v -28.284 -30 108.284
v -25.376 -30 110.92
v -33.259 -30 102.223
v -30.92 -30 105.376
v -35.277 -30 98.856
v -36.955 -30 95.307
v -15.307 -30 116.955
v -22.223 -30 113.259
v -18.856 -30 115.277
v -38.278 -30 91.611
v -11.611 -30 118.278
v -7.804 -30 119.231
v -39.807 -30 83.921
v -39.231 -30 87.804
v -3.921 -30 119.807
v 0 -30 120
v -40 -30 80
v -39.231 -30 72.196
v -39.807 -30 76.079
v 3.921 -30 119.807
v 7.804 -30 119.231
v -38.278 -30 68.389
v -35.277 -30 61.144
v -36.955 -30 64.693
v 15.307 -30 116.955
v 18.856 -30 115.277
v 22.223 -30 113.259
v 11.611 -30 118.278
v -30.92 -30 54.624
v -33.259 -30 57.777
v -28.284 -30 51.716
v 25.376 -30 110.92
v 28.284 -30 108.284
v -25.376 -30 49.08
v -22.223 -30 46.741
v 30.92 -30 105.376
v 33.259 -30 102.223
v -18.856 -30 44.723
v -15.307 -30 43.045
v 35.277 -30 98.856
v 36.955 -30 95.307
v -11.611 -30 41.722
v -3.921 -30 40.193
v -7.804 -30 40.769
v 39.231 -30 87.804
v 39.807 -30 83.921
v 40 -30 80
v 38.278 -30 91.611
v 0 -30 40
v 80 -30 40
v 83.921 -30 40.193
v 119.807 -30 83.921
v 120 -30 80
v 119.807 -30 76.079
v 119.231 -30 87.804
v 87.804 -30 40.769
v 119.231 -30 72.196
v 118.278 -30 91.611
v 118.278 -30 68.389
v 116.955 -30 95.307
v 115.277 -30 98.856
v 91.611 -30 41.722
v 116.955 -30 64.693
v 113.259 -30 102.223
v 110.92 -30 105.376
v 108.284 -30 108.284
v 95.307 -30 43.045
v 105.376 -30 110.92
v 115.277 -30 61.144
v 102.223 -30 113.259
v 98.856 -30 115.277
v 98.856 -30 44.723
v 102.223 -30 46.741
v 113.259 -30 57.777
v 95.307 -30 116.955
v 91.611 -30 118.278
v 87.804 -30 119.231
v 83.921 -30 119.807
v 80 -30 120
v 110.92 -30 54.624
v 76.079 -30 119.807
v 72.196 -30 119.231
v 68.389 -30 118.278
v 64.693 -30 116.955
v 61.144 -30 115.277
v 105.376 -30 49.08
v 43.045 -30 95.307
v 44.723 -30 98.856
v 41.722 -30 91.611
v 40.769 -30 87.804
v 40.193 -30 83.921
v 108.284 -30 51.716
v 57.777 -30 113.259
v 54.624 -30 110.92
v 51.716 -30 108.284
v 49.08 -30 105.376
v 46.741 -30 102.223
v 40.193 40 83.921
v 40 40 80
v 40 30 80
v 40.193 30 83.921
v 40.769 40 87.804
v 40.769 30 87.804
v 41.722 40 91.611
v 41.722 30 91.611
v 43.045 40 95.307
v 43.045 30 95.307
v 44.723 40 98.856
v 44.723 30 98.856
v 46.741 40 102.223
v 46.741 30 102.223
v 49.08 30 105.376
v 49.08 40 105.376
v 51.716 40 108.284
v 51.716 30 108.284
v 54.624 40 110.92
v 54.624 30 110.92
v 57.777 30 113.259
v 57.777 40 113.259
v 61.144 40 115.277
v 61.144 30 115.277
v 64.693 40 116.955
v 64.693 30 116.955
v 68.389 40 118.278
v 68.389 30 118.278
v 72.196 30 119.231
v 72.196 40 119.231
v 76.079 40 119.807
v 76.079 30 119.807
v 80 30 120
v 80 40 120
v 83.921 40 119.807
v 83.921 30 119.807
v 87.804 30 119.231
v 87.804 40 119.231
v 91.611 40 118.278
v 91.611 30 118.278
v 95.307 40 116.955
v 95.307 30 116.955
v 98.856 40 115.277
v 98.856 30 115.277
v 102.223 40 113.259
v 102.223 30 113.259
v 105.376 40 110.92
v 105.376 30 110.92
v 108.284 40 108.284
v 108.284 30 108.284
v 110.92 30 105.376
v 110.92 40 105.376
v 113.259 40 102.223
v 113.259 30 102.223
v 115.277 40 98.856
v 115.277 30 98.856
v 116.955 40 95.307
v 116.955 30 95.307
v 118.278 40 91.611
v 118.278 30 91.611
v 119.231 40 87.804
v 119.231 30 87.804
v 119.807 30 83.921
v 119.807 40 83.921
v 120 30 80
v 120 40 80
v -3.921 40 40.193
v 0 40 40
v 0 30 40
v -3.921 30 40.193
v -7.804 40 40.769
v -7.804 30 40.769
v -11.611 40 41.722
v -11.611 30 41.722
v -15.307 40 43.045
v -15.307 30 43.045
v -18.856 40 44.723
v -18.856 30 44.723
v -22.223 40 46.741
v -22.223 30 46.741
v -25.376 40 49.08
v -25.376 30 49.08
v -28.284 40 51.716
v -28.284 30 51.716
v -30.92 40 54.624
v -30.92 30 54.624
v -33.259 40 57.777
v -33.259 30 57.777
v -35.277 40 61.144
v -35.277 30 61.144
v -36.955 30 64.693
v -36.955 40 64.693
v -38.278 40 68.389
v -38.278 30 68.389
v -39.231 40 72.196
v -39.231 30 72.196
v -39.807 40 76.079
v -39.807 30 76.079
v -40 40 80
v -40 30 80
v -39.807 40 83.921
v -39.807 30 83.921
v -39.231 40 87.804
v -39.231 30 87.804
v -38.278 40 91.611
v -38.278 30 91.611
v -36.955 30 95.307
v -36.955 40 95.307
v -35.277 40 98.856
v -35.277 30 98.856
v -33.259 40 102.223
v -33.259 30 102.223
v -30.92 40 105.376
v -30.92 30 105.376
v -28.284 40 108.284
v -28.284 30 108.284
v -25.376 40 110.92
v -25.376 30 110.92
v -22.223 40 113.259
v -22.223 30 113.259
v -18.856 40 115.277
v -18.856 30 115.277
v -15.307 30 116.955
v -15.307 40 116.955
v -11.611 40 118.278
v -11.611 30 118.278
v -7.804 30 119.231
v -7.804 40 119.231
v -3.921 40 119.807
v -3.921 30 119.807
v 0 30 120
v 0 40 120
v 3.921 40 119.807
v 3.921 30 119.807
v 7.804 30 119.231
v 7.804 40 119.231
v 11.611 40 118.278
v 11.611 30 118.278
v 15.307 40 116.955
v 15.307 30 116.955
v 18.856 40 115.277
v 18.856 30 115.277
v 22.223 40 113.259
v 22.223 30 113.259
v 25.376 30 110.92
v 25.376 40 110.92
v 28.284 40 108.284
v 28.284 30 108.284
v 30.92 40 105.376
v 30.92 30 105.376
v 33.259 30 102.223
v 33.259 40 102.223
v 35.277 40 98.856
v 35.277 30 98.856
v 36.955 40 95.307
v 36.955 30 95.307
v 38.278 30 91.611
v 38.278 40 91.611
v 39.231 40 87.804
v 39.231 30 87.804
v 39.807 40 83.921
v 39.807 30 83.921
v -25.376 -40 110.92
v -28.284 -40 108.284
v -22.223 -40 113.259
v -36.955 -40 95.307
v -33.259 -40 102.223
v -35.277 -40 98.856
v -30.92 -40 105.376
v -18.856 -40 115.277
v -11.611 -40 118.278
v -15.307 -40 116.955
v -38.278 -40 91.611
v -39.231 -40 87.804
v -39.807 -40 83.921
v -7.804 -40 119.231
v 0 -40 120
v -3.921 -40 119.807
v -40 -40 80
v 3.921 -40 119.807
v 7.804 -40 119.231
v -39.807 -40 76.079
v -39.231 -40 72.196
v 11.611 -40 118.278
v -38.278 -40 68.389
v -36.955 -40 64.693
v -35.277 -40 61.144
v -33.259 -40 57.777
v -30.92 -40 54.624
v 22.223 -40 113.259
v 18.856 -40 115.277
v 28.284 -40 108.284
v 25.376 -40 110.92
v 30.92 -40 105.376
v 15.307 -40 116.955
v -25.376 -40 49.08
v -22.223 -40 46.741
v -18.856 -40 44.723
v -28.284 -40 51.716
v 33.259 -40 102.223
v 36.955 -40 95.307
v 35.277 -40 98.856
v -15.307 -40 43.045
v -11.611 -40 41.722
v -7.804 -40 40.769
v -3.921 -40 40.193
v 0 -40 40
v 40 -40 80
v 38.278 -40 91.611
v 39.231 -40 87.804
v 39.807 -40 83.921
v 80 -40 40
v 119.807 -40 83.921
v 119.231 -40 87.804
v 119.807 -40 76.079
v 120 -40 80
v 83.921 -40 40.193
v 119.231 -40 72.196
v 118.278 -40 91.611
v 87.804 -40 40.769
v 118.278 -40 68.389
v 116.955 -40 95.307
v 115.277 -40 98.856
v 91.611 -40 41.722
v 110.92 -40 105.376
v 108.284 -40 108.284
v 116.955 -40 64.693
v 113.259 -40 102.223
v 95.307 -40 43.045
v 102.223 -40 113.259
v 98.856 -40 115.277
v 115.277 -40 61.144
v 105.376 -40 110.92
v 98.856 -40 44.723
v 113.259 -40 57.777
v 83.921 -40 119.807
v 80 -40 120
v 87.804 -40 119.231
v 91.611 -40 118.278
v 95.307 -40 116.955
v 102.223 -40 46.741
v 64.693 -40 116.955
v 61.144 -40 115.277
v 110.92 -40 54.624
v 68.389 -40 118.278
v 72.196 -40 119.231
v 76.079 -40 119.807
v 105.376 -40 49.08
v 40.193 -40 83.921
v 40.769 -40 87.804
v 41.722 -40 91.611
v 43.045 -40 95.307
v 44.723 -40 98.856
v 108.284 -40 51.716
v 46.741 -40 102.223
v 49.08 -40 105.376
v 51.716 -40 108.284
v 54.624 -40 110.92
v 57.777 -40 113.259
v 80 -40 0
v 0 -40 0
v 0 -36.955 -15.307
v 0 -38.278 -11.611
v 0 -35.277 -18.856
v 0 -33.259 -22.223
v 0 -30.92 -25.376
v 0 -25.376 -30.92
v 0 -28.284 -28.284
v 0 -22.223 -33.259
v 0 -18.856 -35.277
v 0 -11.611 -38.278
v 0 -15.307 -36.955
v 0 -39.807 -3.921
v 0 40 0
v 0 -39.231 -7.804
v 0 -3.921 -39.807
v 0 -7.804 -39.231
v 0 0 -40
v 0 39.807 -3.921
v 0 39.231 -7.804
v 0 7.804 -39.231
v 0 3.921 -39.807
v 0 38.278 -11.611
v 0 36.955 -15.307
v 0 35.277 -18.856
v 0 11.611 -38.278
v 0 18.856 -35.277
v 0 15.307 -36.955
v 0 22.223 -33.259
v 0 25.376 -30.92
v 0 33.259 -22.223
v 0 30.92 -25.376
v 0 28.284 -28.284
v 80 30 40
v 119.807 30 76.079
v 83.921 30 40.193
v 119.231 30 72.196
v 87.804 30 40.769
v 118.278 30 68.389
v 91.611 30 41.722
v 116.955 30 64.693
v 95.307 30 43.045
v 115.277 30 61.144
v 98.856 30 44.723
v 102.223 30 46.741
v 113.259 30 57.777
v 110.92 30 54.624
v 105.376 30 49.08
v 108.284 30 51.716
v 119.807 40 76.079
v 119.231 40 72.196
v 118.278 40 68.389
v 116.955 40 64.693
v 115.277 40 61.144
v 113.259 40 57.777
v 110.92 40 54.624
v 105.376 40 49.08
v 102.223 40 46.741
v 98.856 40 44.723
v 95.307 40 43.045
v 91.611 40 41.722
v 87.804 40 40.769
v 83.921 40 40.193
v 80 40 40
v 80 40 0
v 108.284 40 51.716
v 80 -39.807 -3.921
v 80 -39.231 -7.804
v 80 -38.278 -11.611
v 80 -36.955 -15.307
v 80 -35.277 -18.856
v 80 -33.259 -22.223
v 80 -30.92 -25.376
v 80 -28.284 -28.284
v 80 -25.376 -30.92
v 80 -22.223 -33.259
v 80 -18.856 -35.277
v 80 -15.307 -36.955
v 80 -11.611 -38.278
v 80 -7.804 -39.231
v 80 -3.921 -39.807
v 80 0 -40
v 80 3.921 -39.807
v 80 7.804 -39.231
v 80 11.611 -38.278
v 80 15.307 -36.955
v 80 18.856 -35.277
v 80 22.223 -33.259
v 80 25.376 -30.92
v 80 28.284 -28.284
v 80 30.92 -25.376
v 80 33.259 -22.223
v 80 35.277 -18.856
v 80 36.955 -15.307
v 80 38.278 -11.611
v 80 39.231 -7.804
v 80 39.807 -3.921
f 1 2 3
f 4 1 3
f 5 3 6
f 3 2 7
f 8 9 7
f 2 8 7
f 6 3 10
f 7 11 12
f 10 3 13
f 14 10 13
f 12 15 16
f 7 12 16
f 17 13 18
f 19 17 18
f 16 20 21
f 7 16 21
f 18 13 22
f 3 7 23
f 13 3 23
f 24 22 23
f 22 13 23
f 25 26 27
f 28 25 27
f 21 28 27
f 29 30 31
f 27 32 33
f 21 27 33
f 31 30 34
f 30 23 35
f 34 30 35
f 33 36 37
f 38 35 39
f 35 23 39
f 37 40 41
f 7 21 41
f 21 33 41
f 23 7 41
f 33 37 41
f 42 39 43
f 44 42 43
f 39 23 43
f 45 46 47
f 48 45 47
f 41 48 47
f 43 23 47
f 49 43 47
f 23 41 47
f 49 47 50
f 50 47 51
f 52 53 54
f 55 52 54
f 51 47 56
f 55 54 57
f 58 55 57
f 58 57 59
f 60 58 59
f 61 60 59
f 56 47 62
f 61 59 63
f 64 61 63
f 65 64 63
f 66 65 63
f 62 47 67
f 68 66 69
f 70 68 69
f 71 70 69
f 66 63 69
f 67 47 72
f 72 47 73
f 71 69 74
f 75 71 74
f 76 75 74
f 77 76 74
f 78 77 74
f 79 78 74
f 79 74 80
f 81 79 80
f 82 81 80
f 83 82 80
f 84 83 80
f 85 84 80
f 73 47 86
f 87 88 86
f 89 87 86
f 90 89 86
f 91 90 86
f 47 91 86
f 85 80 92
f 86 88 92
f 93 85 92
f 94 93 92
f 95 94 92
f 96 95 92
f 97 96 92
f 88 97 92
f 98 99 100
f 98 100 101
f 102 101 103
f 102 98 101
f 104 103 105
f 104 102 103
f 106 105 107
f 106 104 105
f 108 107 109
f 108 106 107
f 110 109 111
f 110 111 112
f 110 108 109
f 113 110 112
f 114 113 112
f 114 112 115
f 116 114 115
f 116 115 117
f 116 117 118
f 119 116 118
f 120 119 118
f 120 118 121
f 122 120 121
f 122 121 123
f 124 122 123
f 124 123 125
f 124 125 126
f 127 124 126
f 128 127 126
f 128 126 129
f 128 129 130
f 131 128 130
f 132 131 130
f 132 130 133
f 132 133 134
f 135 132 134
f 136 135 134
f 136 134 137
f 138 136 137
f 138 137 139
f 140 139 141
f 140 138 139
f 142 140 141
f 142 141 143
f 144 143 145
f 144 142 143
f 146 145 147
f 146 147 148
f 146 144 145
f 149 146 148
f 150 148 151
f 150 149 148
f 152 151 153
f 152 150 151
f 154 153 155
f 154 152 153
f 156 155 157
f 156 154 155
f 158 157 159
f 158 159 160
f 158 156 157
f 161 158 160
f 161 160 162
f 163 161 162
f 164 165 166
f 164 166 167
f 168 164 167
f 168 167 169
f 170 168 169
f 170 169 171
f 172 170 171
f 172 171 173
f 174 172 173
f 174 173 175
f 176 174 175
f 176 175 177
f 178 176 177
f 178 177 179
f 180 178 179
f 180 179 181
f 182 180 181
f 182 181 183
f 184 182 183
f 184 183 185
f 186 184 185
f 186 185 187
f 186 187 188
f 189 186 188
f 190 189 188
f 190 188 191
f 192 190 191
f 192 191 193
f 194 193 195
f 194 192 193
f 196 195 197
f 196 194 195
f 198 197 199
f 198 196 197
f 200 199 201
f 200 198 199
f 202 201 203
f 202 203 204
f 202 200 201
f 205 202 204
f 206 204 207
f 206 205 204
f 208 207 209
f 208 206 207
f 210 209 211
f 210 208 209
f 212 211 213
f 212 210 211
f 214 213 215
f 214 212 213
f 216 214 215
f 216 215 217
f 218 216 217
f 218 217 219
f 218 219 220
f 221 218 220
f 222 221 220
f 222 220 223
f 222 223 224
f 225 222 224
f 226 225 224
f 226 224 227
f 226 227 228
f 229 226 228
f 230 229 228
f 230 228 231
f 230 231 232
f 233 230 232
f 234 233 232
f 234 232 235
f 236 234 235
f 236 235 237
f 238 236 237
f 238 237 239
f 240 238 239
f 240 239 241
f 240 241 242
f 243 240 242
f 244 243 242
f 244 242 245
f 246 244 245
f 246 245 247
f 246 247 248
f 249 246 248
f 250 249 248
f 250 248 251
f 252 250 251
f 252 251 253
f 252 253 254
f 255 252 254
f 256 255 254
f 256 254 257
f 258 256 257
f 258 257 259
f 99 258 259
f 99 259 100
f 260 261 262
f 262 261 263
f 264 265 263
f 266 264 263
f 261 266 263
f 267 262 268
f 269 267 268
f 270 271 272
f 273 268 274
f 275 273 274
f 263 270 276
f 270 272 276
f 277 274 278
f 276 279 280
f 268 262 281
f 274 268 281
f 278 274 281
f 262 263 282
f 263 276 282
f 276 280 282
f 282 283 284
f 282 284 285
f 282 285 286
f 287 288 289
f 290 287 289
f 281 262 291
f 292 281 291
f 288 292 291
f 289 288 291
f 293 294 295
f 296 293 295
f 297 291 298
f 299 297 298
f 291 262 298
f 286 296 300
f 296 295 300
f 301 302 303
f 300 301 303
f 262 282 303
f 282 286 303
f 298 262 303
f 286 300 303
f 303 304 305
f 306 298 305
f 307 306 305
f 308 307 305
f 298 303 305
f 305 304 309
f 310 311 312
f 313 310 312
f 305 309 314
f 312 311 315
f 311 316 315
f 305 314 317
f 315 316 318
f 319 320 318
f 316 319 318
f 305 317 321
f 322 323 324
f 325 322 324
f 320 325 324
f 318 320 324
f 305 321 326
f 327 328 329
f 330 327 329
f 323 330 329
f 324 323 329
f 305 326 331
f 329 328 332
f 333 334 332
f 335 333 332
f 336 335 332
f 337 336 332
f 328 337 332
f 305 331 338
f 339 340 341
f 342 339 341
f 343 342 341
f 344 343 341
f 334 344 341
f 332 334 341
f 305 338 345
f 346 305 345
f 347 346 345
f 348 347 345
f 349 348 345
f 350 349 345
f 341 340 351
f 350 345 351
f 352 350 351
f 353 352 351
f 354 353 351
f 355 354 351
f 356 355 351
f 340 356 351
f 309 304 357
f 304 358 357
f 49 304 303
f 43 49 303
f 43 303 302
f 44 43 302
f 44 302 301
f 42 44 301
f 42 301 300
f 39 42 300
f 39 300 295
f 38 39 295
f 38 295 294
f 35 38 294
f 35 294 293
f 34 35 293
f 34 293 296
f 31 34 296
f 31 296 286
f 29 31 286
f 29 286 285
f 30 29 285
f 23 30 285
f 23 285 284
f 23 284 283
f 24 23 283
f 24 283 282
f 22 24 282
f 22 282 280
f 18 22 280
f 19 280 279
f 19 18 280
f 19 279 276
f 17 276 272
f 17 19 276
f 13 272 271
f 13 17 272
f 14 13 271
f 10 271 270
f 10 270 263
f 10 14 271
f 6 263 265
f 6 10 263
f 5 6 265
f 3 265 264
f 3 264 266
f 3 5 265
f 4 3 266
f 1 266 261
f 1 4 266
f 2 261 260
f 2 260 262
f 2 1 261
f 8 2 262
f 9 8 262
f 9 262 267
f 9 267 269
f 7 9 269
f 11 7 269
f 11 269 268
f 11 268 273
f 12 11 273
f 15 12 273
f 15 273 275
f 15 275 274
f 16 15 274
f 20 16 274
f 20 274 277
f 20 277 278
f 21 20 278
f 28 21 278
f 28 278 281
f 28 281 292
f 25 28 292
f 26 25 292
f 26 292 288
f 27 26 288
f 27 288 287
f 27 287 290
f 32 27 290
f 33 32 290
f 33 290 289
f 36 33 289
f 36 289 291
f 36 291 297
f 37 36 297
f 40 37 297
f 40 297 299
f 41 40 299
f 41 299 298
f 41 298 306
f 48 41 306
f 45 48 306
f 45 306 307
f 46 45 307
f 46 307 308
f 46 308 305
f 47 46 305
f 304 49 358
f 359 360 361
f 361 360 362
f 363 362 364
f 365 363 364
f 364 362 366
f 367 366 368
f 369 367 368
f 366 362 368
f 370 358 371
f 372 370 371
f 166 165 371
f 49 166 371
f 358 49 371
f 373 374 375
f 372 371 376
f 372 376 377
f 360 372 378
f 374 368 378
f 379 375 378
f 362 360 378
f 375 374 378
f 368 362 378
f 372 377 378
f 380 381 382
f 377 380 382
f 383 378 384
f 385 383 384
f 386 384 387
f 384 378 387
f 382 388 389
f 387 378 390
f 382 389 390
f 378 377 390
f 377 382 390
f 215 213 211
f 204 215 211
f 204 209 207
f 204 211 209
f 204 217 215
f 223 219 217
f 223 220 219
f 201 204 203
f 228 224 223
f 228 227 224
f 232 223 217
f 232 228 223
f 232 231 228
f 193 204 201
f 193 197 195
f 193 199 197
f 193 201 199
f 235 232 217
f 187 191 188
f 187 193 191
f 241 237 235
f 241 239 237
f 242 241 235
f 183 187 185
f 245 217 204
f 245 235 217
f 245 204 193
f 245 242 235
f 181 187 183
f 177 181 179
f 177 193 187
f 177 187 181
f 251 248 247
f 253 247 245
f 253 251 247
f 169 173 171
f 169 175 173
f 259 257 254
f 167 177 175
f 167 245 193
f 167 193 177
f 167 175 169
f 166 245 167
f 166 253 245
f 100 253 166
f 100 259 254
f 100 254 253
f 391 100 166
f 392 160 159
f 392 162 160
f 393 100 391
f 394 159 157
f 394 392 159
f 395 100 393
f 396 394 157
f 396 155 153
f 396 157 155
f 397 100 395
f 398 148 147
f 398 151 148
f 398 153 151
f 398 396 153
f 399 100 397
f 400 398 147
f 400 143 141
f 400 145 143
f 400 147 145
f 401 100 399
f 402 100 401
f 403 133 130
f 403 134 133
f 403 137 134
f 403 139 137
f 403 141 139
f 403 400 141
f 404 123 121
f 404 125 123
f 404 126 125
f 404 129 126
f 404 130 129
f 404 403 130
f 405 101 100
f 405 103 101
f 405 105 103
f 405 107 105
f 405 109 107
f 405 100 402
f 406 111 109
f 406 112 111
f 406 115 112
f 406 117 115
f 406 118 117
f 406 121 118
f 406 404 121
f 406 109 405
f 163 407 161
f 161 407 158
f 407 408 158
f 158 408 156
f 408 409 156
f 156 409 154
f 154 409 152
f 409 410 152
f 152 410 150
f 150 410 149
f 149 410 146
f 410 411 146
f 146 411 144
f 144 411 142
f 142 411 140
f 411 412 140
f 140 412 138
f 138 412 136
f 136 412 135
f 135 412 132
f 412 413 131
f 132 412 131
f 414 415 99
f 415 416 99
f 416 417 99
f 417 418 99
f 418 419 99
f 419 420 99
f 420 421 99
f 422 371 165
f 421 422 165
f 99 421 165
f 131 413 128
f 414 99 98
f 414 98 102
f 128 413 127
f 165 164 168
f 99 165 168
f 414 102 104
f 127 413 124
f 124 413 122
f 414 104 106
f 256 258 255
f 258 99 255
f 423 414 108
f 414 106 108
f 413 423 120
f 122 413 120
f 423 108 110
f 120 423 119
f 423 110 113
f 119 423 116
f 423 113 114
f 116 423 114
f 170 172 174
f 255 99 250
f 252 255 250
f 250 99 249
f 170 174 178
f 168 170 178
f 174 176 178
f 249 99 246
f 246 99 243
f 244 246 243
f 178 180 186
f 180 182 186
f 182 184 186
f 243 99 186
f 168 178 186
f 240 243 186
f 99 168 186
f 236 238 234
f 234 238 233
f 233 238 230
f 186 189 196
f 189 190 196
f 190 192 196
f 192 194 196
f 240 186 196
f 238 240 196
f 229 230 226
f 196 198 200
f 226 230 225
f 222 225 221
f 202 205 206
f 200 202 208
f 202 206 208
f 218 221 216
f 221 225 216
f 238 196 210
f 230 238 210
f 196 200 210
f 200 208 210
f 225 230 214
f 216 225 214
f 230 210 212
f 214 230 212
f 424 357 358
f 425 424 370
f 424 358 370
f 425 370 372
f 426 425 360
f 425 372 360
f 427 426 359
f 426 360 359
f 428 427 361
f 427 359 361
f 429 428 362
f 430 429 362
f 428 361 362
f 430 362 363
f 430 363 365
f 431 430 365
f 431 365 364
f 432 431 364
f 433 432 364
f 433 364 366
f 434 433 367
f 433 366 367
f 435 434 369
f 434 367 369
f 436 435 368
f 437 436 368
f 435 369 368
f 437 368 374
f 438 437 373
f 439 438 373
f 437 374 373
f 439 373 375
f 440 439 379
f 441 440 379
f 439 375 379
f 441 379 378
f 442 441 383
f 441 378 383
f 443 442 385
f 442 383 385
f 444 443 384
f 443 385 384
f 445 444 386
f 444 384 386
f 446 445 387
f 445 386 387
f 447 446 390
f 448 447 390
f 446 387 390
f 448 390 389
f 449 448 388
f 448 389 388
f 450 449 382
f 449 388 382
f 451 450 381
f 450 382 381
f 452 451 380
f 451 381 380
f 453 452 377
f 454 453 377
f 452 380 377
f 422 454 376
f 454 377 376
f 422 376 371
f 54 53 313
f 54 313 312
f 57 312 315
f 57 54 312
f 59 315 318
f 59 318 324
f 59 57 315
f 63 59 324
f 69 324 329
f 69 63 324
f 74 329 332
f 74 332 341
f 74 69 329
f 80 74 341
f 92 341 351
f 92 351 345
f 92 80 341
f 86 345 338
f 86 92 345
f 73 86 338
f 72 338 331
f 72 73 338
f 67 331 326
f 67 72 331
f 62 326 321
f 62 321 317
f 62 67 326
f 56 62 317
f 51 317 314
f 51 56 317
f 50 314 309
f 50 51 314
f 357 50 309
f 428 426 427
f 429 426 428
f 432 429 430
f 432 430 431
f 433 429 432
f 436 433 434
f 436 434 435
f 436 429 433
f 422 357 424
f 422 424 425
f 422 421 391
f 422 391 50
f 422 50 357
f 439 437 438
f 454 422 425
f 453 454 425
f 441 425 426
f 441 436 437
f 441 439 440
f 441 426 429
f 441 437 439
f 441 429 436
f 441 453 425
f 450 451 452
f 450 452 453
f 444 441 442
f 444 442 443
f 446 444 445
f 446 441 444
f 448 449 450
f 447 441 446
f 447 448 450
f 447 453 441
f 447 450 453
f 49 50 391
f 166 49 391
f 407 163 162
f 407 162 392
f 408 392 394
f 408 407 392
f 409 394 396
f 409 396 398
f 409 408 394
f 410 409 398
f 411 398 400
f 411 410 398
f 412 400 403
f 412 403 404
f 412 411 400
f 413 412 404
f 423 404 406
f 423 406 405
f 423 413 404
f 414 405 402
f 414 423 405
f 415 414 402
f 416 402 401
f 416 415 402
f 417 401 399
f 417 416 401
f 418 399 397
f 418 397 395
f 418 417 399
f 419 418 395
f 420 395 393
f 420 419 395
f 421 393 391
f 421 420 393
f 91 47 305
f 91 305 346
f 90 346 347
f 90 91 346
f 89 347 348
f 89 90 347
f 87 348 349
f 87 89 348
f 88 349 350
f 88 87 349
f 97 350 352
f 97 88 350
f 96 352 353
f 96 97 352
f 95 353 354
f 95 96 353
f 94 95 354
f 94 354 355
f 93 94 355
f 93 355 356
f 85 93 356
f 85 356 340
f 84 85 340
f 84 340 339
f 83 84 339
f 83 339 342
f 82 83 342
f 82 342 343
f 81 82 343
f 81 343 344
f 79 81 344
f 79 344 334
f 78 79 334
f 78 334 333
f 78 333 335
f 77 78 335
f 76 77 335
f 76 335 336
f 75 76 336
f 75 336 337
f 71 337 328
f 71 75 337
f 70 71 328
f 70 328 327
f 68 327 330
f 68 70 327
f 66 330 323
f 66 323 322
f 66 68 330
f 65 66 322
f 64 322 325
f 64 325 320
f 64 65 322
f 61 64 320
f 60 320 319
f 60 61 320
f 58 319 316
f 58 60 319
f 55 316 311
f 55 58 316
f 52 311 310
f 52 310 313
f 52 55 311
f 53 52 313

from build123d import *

# Parameters (mm, degrees)
BOSS_EXTRUDE1_DEPTH = 80
BOSS_EXTRUDE2_DEPTH = 80
SKETCH3_W           = 80
SKETCH3_H           = 60
CUT_EXTRUDE1_DEPTH  = 133


with BuildPart() as part:
    # Sketch1 → Boss-Extrude1 (new body)
    with BuildSketch(Plane(origin=(0, 0, 0), x_dir=(0, 0, -1), z_dir=(1, 0, 0))):
        with BuildLine():
            Line((0, 40), (-80, 40))
            Line((-80, 40), (-80, -40))
            Line((-80, -40), (0, -40))
            ThreePointArc((0, -40), (40, 0), (0, 40))
        make_face()
    extrude(amount=BOSS_EXTRUDE1_DEPTH)

    # Sketch2 → Boss-Extrude2 (add)
    with BuildSketch(Plane(origin=(0, 40, 0), x_dir=(1, 0, 0), z_dir=(0, 1, 0))):
        with BuildLine():
            Line((0, -80), (40, -80))
            ThreePointArc((40, -80), (28.284271247, -51.715728753), (0, -40))
            Line((0, -40), (0, -80))
        make_face()
        with BuildLine():
            ThreePointArc((0, -40), (-28.284271247, -108.284271247), (40, -80))
            Line((40, -80), (0, -80))
            Line((0, -80), (0, -40))
        make_face()
        with BuildLine():
            Line((80, -80), (40, -80))
            ThreePointArc((40, -80), (80, -120), (120, -80))
            ThreePointArc((120, -80), (108.284271247, -51.715728753), (80, -40))
            Line((80, -40), (80, -80))
        make_face()
        with BuildLine():
            ThreePointArc((80, -40), (51.715728753, -51.715728753), (40, -80))
            Line((40, -80), (80, -80))
            Line((80, -80), (80, -40))
        make_face()
    extrude(amount=-BOSS_EXTRUDE2_DEPTH)

    # Sketch3 → Cut-Extrude1 (cut, symmetric)
    with BuildSketch(Plane(origin=(80, 0, 0), x_dir=(0, 0, -1), z_dir=(1, 0, 0))):
        with Locations((-80, 0)):
            Rectangle(SKETCH3_W, SKETCH3_H)
    extrude(amount=CUT_EXTRUDE1_DEPTH, both=True, mode=Mode.SUBTRACT)


solid = part.part
